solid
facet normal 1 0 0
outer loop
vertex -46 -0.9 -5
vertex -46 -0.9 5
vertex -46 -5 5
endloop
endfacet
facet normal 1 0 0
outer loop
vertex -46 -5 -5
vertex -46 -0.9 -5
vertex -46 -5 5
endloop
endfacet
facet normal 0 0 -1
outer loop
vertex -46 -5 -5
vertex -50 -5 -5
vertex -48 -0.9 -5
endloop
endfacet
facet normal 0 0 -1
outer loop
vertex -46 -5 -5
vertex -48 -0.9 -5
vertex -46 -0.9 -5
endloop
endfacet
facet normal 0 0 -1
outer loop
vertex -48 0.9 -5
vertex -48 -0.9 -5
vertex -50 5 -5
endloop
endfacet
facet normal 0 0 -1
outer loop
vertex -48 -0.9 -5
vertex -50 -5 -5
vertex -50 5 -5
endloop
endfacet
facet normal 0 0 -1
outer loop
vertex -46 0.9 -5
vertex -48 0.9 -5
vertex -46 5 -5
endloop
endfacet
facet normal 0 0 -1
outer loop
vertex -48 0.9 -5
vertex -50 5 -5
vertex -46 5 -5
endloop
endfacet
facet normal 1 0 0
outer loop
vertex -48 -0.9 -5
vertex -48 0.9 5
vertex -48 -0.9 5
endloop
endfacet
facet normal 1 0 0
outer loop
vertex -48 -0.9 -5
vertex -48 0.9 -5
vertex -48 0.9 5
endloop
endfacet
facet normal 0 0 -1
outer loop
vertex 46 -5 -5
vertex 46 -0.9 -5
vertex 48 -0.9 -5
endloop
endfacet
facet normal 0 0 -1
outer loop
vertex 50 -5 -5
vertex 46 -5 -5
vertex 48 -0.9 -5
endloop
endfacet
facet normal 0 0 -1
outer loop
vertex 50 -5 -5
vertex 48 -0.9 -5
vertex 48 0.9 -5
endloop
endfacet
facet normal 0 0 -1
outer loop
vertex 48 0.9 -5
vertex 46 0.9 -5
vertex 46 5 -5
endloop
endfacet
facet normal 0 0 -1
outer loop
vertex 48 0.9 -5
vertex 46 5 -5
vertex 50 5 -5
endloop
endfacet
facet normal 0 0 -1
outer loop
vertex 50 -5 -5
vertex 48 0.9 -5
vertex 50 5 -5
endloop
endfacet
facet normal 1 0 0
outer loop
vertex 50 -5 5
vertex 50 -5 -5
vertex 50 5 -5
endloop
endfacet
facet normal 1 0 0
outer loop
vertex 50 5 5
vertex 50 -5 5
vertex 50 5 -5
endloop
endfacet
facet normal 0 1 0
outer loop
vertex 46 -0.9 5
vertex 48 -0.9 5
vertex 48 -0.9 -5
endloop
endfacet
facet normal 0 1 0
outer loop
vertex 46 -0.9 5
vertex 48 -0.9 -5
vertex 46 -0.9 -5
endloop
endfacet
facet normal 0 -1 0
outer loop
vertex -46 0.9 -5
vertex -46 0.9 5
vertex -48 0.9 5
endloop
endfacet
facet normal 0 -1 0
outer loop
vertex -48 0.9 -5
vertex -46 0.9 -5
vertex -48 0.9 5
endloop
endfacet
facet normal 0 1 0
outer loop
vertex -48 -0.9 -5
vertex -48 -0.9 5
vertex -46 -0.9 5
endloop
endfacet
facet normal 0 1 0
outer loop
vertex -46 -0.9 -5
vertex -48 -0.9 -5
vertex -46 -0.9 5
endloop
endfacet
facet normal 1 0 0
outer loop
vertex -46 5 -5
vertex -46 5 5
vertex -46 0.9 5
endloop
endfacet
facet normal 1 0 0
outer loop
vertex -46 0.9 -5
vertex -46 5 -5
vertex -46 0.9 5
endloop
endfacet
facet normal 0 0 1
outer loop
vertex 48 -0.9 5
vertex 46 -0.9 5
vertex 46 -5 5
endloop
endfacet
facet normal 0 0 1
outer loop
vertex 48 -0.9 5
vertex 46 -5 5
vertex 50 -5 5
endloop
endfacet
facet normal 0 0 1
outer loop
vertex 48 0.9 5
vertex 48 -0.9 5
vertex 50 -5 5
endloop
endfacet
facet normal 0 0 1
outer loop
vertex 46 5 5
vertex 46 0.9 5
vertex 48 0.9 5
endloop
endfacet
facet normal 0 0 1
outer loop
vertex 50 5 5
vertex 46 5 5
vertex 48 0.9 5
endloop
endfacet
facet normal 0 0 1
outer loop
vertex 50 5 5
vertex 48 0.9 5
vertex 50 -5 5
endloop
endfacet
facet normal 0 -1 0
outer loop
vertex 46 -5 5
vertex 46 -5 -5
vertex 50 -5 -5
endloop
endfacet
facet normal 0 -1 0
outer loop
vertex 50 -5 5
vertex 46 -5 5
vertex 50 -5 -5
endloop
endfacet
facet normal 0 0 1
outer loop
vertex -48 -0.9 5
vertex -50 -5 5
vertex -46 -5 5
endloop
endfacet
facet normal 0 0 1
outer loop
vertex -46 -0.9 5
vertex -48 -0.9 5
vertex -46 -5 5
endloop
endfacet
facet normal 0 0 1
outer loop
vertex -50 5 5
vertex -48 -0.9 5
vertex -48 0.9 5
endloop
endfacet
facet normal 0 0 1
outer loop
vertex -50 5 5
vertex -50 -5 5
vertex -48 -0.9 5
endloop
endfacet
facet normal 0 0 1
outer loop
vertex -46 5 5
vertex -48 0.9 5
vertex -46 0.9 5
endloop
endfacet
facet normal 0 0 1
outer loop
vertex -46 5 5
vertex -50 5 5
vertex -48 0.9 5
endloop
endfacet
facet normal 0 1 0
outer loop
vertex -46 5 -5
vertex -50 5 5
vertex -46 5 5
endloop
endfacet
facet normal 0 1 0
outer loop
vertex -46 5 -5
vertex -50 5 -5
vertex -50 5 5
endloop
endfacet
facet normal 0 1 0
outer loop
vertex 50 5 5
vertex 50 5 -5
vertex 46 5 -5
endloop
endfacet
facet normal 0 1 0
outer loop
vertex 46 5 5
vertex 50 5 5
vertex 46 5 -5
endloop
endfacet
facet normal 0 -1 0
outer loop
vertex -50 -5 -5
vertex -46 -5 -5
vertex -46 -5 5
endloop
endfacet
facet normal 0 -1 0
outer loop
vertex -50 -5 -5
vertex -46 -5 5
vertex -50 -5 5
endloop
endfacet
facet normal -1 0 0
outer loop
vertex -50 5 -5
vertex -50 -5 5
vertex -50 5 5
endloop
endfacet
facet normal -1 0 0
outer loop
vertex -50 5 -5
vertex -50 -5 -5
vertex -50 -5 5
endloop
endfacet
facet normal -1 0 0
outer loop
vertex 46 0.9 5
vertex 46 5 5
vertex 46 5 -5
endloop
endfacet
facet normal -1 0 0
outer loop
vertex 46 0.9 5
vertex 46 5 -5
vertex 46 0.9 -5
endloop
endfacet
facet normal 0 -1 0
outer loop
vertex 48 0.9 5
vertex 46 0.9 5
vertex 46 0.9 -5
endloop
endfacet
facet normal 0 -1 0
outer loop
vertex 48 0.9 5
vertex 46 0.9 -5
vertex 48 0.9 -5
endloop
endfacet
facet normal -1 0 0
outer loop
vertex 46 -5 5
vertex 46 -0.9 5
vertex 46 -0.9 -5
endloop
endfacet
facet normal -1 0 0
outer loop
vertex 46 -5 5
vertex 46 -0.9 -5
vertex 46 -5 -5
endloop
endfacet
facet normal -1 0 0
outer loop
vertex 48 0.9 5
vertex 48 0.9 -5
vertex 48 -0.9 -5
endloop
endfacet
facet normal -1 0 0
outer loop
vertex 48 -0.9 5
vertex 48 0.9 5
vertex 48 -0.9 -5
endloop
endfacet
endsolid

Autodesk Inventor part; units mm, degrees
ref_plane "YZ Plane" through (0, 0, 0) normal (1, 0, 0) x (0, 1, 0)
ref_plane "XZ Plane" through (0, 0, 0) normal (0, 1, 0) x (-1, 0, 0)
ref_plane "XY Plane" through (0, 0, 0) normal (0, 0, 1) x (1, 0, 0)
sketch "Sketch1" plane through (0, 0, 0) normal (0, 0, 1) x (1, 0, 0)
  line L0 (-46, 5) -> (-46, 0.9)
  line L1 (-46, 0.9) -> (-48, 0.9)
  line L2 (-48, 0.9) -> (-48, -0.9)
  line L3 (-48, -0.9) -> (-46, -0.9)
  line L4 (-46, -0.9) -> (-46, -5)
  line L5 (-46, -5) -> (-50, -5)
  line L6 (-50, -5) -> (-50, 5)
  line L7 (-50, 5) -> (-46, 5)
  line L8 (0, 5) -> (0, -5)
  line L9 (46, 5) -> (46, 0.9)
  line L10 (46, 0.9) -> (48, 0.9)
  line L11 (48, 0.9) -> (48, -0.9)
  line L12 (48, -0.9) -> (46, -0.9)
  line L13 (46, -0.9) -> (46, -5)
  line L14 (46, -5) -> (50, -5)
  line L15 (50, -5) -> (50, 5)
  line L16 (50, 5) -> (46, 5)
  point P0 (0, 0)
  point P1 (-48, 0)
  point P2 (-50, 0)
  dimension "d0" = 100
  dimension "d1" = 2
  dimension "d2" = 96
  dimension "d3" = 4
  dimension "d4" = 1.8
  dimension "d5" = 10
  dimension "d6" = 2
  dimension "d7" = 92
extrude "Extrusion1" add sketch "Sketch1" along normal mid plane 10
properties part number "CardRailStandard" material "Aluminum"
